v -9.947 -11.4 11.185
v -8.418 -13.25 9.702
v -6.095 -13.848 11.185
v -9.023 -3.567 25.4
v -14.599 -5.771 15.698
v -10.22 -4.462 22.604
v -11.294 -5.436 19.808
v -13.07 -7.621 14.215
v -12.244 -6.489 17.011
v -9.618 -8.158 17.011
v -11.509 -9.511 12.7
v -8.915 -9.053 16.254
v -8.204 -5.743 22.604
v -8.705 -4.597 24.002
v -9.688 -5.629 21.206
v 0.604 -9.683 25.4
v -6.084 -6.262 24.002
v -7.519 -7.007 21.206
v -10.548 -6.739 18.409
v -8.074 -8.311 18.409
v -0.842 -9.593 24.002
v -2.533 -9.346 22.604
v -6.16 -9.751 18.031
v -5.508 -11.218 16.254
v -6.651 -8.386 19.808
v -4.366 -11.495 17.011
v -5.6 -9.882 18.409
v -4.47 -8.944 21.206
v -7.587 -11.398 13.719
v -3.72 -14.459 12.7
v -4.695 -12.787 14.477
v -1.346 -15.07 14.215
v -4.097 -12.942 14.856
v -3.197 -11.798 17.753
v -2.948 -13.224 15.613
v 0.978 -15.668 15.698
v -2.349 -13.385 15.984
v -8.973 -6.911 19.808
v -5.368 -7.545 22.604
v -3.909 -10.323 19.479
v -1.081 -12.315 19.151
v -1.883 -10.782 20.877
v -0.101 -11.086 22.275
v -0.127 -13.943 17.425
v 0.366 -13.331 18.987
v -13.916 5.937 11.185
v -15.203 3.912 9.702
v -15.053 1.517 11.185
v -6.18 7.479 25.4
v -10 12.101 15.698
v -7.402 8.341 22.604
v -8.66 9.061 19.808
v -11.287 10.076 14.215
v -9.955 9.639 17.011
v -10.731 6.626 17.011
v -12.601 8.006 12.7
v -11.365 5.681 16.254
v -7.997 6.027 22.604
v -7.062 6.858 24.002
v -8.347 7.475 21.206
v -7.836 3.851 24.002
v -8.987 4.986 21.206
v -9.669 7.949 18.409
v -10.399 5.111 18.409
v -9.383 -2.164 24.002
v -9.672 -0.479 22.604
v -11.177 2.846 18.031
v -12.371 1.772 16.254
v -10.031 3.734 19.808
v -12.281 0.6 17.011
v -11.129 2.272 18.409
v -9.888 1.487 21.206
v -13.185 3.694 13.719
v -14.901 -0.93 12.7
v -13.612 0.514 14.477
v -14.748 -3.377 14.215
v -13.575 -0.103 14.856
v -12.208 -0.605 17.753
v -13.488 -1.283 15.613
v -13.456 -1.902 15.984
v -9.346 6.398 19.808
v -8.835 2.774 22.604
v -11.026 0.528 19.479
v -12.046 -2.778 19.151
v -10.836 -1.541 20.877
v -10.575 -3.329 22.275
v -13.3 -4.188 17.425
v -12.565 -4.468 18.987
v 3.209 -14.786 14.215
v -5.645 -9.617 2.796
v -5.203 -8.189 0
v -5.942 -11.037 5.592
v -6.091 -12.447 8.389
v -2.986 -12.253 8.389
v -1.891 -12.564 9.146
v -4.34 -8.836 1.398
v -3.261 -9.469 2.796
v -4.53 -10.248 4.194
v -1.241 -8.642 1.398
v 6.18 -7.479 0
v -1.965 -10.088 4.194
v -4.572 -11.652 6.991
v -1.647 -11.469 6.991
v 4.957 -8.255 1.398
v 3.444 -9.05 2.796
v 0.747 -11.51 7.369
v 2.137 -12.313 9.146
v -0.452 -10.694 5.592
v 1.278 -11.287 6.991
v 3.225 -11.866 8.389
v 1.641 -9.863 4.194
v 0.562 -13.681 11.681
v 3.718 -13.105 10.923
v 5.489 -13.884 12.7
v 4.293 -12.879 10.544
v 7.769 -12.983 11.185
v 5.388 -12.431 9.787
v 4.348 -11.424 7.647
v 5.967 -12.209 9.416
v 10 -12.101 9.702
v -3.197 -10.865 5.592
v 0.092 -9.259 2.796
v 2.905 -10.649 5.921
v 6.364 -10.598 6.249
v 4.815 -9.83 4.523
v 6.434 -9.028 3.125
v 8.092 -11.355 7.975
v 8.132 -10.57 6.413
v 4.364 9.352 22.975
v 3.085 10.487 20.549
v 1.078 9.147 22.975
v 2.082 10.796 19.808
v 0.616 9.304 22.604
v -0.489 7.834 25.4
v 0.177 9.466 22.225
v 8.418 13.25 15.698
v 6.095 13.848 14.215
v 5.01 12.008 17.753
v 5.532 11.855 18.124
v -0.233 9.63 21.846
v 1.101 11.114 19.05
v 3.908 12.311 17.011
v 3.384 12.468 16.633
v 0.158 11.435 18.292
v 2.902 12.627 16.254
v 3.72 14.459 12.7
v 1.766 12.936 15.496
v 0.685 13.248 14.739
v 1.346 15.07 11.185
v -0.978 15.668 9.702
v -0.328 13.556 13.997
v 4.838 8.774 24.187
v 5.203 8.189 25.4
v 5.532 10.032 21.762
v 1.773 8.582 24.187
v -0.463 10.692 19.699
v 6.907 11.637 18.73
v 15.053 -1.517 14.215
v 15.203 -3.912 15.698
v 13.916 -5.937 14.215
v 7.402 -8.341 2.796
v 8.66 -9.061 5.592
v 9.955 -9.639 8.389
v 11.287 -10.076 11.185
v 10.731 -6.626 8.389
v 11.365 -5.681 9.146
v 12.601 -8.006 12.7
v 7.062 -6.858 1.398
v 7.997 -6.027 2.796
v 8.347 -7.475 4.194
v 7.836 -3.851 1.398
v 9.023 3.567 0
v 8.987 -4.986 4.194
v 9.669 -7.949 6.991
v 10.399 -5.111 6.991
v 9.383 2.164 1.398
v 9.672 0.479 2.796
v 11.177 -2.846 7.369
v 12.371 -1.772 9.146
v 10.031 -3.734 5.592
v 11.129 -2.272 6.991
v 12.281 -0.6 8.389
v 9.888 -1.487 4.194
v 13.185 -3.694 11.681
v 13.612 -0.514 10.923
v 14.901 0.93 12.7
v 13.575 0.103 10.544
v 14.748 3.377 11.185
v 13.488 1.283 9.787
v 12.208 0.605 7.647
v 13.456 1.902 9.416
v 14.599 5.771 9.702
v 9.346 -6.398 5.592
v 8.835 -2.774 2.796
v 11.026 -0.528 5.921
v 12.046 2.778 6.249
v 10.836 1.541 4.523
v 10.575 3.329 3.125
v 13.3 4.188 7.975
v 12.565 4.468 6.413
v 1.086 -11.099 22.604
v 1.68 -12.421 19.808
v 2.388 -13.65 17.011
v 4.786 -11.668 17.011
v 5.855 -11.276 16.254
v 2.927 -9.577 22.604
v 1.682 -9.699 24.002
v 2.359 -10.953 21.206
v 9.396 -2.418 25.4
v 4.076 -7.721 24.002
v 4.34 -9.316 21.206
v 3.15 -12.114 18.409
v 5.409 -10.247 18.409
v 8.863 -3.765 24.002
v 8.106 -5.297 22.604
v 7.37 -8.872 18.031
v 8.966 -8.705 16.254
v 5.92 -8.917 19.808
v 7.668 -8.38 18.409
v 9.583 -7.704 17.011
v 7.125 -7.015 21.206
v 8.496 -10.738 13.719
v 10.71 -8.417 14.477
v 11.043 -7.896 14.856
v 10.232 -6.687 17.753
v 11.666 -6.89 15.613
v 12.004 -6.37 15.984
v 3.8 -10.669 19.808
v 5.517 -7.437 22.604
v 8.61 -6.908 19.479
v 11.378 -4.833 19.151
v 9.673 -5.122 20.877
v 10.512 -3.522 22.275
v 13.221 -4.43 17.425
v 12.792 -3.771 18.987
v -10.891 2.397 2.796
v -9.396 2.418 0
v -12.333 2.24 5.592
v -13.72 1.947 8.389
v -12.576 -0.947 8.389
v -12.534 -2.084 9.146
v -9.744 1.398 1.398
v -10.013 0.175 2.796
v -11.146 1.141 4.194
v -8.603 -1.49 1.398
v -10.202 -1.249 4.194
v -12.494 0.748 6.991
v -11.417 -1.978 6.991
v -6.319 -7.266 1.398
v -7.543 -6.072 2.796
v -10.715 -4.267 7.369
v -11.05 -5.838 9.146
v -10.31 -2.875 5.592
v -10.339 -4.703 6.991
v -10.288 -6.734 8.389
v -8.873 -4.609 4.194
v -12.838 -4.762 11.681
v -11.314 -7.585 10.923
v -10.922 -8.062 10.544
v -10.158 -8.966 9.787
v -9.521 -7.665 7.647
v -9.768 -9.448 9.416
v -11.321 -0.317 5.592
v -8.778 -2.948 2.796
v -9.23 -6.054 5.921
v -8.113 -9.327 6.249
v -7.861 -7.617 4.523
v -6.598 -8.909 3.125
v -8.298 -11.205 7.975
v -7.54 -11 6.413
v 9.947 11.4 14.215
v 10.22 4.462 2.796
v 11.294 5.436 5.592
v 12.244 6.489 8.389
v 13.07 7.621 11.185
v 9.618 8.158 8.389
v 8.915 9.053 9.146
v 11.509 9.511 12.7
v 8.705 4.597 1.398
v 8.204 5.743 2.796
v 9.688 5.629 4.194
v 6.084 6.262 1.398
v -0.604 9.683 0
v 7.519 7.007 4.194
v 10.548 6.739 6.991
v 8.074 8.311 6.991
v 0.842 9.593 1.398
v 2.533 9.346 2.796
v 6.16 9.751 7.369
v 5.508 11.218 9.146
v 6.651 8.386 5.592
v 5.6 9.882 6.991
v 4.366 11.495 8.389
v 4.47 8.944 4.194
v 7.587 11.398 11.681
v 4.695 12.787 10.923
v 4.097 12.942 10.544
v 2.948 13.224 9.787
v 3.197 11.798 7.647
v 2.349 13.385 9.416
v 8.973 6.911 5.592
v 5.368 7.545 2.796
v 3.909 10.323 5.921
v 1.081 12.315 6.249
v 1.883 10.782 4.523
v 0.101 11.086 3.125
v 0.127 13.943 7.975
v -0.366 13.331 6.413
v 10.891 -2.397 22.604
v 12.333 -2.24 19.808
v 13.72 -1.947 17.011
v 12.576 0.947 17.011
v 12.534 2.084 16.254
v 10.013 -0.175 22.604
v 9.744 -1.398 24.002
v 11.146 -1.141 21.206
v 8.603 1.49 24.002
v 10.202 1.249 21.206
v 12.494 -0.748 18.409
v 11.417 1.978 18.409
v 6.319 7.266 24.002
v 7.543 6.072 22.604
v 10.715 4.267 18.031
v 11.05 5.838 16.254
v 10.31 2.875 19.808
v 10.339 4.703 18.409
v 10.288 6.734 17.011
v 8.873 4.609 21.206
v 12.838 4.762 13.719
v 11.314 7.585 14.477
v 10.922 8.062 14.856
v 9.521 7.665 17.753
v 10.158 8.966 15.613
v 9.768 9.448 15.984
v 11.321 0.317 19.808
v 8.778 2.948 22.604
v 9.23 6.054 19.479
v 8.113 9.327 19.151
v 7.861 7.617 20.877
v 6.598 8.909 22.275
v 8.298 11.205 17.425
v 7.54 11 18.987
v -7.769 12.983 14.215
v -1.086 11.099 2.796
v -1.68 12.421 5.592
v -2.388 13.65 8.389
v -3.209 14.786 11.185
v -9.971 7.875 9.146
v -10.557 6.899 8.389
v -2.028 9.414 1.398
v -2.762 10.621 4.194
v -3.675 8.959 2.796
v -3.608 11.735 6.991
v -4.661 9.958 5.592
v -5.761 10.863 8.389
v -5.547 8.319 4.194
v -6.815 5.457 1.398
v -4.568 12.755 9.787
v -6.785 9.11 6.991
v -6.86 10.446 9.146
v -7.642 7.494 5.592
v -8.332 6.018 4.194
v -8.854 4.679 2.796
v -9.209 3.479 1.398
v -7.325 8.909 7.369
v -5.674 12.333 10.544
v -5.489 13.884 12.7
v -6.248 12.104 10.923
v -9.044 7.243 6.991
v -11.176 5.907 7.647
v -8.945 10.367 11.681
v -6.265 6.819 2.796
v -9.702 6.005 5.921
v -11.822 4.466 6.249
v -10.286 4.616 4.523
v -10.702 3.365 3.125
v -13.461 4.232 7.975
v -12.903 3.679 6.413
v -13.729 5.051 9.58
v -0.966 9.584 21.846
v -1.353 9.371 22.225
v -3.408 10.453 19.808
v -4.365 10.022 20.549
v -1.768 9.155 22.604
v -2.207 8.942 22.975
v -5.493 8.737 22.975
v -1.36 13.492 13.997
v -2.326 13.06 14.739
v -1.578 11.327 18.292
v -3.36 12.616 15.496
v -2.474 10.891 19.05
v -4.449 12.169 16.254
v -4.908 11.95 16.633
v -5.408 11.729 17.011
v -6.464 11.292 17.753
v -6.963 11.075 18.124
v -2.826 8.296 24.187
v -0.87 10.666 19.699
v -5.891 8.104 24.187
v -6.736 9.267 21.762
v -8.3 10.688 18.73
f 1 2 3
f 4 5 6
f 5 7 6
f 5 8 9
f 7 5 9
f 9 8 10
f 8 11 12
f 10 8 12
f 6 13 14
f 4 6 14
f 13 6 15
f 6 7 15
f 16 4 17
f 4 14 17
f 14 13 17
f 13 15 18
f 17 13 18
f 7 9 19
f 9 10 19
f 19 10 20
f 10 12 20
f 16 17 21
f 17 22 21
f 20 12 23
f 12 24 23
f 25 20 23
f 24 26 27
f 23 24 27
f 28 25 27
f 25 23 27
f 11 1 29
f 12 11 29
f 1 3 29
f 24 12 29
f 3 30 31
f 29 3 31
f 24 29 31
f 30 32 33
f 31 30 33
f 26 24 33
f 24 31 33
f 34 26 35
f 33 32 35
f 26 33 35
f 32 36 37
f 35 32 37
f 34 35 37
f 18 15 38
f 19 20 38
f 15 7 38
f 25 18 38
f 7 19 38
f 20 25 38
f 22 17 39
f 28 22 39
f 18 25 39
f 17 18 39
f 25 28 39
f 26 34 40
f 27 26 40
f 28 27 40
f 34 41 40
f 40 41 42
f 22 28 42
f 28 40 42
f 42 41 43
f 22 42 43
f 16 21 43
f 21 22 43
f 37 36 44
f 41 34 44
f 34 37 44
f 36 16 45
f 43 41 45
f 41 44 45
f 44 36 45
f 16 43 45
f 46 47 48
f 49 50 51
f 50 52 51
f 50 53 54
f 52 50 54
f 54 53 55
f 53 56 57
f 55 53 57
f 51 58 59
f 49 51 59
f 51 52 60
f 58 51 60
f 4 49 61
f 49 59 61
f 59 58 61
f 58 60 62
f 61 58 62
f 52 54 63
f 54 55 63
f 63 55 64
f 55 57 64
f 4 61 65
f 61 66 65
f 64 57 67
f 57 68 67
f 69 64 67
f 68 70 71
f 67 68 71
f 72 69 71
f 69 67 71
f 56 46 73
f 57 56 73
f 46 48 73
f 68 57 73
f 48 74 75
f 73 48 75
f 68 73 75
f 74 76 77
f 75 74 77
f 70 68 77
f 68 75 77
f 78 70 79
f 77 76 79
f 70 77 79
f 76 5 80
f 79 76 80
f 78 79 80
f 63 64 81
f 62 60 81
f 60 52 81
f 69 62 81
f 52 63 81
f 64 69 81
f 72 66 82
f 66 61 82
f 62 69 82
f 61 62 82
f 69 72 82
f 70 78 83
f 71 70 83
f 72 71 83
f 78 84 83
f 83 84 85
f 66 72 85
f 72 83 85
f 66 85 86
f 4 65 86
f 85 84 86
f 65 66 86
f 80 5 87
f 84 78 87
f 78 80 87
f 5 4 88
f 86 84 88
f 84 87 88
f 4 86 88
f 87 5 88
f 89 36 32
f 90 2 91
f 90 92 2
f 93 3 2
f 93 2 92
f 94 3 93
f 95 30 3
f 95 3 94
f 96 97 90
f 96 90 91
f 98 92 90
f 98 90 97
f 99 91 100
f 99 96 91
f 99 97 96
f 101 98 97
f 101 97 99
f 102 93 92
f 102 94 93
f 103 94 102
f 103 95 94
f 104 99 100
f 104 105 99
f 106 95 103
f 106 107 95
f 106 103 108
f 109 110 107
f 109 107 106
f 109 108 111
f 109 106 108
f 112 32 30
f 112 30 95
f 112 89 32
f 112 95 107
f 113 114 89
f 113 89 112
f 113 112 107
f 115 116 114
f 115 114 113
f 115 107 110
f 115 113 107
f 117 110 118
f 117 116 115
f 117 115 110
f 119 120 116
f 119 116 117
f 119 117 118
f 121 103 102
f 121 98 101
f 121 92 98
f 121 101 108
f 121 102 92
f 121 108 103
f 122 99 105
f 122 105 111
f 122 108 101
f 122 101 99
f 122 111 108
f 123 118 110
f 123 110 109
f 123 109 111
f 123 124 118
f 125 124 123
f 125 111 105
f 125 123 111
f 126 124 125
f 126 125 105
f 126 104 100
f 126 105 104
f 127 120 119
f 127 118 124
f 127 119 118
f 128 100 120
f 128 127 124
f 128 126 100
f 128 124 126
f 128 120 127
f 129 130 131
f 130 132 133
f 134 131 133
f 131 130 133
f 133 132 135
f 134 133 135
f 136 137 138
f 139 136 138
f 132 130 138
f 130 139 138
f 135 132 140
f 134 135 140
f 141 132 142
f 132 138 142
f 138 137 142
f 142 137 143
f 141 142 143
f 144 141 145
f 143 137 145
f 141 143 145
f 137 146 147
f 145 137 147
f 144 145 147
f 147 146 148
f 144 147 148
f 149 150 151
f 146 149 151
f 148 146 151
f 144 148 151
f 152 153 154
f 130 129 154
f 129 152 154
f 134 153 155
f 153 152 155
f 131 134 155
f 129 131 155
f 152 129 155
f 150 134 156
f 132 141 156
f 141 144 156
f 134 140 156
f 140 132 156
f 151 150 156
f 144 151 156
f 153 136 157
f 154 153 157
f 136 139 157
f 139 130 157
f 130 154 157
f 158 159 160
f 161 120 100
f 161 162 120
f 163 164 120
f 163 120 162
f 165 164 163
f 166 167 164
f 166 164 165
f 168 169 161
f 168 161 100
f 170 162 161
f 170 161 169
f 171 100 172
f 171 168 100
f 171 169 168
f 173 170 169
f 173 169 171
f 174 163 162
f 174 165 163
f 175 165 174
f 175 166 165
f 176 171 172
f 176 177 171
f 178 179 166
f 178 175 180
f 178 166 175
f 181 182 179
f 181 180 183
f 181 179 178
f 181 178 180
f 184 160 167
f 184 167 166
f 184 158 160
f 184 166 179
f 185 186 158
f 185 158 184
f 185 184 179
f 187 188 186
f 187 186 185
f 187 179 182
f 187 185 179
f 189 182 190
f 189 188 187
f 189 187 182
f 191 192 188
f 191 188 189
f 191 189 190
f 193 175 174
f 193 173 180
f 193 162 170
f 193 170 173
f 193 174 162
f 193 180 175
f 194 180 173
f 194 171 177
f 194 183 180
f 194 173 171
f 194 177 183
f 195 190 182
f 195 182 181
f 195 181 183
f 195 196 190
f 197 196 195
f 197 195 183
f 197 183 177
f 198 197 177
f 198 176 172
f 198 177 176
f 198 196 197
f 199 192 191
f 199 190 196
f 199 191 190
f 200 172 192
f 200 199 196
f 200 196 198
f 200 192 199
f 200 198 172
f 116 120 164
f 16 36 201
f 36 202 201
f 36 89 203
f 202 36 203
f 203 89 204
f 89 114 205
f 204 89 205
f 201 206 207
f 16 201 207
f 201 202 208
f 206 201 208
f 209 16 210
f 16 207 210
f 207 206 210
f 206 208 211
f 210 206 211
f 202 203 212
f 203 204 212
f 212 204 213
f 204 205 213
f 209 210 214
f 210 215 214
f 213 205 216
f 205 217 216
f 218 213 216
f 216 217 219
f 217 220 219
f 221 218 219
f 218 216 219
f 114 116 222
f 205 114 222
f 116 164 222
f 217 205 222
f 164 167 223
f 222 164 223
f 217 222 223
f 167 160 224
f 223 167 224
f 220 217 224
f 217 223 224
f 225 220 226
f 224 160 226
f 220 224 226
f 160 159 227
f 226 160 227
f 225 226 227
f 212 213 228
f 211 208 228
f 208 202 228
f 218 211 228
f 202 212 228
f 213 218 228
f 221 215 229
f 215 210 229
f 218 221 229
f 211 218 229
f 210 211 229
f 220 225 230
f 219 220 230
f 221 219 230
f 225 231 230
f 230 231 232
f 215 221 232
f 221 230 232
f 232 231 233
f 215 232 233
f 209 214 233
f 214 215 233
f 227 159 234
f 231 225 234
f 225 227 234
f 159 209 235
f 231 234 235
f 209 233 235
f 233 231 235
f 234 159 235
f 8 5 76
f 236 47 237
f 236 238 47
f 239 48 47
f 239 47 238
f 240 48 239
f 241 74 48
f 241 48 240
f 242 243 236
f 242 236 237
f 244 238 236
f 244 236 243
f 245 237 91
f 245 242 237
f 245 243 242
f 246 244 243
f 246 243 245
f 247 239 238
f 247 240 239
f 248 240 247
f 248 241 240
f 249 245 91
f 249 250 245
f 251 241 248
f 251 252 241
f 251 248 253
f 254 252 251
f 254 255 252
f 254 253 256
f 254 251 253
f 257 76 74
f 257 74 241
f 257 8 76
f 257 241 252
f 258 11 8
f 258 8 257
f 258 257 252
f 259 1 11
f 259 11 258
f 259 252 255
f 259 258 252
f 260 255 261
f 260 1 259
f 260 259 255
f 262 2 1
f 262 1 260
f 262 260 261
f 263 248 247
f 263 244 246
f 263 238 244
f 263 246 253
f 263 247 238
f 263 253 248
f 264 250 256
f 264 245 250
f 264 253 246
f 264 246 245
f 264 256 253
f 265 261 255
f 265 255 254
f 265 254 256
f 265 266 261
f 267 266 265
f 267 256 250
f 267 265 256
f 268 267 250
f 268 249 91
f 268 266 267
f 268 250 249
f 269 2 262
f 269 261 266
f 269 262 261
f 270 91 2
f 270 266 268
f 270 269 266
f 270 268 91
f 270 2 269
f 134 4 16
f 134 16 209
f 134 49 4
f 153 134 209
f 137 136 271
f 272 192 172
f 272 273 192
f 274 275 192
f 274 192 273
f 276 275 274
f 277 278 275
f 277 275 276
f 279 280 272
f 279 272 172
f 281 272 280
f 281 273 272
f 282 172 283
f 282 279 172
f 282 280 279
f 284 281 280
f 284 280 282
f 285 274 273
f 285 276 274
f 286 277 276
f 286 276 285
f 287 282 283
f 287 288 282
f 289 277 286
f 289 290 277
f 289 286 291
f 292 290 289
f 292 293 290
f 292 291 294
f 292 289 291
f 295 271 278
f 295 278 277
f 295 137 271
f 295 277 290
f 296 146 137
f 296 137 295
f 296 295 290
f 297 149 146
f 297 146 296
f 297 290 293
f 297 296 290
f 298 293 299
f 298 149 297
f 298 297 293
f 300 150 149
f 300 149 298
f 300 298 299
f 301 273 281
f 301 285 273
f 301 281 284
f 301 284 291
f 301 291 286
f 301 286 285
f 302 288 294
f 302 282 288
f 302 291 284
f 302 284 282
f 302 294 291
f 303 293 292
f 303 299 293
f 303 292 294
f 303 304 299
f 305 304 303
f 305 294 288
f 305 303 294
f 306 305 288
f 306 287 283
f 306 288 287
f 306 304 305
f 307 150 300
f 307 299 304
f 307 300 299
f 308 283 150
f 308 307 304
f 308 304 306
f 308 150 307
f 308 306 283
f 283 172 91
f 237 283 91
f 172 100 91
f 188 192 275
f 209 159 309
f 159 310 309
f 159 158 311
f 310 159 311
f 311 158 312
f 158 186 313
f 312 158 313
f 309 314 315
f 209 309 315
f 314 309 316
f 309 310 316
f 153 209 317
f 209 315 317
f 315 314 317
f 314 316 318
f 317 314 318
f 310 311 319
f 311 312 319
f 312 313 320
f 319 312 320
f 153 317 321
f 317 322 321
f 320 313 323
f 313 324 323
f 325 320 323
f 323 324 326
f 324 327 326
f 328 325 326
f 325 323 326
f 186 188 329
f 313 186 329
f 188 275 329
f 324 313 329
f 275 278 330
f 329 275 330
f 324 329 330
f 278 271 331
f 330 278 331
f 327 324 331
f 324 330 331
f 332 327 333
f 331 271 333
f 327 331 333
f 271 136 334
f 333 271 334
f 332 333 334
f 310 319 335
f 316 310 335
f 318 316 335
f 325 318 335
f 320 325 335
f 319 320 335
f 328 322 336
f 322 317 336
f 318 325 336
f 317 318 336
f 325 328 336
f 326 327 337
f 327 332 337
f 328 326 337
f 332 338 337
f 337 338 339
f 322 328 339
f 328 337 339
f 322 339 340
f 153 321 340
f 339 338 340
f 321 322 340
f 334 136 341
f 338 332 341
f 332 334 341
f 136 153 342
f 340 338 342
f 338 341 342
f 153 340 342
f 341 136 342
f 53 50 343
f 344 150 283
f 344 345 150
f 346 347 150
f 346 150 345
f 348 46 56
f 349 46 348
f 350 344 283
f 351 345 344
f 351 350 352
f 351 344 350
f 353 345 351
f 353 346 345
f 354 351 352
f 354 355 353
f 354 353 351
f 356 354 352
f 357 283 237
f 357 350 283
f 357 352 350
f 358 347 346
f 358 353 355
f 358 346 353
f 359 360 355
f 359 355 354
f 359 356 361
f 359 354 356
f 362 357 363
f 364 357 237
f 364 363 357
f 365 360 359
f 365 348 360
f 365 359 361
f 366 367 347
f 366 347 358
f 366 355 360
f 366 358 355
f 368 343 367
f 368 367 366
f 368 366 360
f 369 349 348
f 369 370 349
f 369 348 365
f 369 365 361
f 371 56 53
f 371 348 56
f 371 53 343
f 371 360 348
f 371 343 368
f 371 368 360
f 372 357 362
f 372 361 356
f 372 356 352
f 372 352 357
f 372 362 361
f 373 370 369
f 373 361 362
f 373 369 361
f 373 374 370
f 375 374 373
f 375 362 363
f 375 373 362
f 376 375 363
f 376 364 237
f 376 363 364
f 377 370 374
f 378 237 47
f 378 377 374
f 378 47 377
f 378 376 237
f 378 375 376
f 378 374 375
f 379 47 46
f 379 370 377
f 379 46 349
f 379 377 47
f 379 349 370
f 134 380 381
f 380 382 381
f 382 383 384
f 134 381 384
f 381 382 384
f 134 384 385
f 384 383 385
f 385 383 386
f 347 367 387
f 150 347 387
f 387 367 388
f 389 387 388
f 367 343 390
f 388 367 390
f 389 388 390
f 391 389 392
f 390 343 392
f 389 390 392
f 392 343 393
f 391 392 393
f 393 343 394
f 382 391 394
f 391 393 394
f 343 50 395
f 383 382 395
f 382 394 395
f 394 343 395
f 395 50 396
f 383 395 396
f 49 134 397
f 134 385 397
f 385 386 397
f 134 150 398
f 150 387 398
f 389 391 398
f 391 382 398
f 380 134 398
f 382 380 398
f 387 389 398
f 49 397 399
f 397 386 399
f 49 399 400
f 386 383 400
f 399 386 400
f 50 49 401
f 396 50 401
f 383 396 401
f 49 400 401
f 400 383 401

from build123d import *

# Parameters (mm, degrees)
F2_DEPTH = 25.4
F2_TAPER = -26.56505118
F4_DEPTH = 25.4
F4_TAPER = -26.56505118


with BuildPart() as f2:
    # F1 (on Top) → F2 (new body)
    with BuildSketch(Plane.XY):
        Polygon((9.0225406837, 3.5668390717), (-0.6041471381, 9.6831600001), (-9.3959241492, 2.4176829268), (-5.2028533419, -8.1889497773), (6.1803839455, -7.4787322214), align=None)
    extrude(amount=F2_DEPTH, taper=F2_TAPER)


with BuildPart() as f4:
    # F3 (on face) → F4 (new body)
    with BuildSketch(Plane.XY.offset(25.4)):
        Polygon((-9.0225406837, -3.5668390717), (0.6041471381, -9.6831600001), (9.3959241492, -2.4176829268), (5.2028533419, 8.1889497773), (-0.4887653018, 7.8338409994), (-6.1803839455, 7.4787322214), align=None)
    extrude(amount=-F4_DEPTH, taper=F4_TAPER)


with BuildPart() as f2_1:
    add(f2.part)

    # F5: intersect F4
    add(f4.part, mode=Mode.INTERSECT)


solid = f2_1.part
